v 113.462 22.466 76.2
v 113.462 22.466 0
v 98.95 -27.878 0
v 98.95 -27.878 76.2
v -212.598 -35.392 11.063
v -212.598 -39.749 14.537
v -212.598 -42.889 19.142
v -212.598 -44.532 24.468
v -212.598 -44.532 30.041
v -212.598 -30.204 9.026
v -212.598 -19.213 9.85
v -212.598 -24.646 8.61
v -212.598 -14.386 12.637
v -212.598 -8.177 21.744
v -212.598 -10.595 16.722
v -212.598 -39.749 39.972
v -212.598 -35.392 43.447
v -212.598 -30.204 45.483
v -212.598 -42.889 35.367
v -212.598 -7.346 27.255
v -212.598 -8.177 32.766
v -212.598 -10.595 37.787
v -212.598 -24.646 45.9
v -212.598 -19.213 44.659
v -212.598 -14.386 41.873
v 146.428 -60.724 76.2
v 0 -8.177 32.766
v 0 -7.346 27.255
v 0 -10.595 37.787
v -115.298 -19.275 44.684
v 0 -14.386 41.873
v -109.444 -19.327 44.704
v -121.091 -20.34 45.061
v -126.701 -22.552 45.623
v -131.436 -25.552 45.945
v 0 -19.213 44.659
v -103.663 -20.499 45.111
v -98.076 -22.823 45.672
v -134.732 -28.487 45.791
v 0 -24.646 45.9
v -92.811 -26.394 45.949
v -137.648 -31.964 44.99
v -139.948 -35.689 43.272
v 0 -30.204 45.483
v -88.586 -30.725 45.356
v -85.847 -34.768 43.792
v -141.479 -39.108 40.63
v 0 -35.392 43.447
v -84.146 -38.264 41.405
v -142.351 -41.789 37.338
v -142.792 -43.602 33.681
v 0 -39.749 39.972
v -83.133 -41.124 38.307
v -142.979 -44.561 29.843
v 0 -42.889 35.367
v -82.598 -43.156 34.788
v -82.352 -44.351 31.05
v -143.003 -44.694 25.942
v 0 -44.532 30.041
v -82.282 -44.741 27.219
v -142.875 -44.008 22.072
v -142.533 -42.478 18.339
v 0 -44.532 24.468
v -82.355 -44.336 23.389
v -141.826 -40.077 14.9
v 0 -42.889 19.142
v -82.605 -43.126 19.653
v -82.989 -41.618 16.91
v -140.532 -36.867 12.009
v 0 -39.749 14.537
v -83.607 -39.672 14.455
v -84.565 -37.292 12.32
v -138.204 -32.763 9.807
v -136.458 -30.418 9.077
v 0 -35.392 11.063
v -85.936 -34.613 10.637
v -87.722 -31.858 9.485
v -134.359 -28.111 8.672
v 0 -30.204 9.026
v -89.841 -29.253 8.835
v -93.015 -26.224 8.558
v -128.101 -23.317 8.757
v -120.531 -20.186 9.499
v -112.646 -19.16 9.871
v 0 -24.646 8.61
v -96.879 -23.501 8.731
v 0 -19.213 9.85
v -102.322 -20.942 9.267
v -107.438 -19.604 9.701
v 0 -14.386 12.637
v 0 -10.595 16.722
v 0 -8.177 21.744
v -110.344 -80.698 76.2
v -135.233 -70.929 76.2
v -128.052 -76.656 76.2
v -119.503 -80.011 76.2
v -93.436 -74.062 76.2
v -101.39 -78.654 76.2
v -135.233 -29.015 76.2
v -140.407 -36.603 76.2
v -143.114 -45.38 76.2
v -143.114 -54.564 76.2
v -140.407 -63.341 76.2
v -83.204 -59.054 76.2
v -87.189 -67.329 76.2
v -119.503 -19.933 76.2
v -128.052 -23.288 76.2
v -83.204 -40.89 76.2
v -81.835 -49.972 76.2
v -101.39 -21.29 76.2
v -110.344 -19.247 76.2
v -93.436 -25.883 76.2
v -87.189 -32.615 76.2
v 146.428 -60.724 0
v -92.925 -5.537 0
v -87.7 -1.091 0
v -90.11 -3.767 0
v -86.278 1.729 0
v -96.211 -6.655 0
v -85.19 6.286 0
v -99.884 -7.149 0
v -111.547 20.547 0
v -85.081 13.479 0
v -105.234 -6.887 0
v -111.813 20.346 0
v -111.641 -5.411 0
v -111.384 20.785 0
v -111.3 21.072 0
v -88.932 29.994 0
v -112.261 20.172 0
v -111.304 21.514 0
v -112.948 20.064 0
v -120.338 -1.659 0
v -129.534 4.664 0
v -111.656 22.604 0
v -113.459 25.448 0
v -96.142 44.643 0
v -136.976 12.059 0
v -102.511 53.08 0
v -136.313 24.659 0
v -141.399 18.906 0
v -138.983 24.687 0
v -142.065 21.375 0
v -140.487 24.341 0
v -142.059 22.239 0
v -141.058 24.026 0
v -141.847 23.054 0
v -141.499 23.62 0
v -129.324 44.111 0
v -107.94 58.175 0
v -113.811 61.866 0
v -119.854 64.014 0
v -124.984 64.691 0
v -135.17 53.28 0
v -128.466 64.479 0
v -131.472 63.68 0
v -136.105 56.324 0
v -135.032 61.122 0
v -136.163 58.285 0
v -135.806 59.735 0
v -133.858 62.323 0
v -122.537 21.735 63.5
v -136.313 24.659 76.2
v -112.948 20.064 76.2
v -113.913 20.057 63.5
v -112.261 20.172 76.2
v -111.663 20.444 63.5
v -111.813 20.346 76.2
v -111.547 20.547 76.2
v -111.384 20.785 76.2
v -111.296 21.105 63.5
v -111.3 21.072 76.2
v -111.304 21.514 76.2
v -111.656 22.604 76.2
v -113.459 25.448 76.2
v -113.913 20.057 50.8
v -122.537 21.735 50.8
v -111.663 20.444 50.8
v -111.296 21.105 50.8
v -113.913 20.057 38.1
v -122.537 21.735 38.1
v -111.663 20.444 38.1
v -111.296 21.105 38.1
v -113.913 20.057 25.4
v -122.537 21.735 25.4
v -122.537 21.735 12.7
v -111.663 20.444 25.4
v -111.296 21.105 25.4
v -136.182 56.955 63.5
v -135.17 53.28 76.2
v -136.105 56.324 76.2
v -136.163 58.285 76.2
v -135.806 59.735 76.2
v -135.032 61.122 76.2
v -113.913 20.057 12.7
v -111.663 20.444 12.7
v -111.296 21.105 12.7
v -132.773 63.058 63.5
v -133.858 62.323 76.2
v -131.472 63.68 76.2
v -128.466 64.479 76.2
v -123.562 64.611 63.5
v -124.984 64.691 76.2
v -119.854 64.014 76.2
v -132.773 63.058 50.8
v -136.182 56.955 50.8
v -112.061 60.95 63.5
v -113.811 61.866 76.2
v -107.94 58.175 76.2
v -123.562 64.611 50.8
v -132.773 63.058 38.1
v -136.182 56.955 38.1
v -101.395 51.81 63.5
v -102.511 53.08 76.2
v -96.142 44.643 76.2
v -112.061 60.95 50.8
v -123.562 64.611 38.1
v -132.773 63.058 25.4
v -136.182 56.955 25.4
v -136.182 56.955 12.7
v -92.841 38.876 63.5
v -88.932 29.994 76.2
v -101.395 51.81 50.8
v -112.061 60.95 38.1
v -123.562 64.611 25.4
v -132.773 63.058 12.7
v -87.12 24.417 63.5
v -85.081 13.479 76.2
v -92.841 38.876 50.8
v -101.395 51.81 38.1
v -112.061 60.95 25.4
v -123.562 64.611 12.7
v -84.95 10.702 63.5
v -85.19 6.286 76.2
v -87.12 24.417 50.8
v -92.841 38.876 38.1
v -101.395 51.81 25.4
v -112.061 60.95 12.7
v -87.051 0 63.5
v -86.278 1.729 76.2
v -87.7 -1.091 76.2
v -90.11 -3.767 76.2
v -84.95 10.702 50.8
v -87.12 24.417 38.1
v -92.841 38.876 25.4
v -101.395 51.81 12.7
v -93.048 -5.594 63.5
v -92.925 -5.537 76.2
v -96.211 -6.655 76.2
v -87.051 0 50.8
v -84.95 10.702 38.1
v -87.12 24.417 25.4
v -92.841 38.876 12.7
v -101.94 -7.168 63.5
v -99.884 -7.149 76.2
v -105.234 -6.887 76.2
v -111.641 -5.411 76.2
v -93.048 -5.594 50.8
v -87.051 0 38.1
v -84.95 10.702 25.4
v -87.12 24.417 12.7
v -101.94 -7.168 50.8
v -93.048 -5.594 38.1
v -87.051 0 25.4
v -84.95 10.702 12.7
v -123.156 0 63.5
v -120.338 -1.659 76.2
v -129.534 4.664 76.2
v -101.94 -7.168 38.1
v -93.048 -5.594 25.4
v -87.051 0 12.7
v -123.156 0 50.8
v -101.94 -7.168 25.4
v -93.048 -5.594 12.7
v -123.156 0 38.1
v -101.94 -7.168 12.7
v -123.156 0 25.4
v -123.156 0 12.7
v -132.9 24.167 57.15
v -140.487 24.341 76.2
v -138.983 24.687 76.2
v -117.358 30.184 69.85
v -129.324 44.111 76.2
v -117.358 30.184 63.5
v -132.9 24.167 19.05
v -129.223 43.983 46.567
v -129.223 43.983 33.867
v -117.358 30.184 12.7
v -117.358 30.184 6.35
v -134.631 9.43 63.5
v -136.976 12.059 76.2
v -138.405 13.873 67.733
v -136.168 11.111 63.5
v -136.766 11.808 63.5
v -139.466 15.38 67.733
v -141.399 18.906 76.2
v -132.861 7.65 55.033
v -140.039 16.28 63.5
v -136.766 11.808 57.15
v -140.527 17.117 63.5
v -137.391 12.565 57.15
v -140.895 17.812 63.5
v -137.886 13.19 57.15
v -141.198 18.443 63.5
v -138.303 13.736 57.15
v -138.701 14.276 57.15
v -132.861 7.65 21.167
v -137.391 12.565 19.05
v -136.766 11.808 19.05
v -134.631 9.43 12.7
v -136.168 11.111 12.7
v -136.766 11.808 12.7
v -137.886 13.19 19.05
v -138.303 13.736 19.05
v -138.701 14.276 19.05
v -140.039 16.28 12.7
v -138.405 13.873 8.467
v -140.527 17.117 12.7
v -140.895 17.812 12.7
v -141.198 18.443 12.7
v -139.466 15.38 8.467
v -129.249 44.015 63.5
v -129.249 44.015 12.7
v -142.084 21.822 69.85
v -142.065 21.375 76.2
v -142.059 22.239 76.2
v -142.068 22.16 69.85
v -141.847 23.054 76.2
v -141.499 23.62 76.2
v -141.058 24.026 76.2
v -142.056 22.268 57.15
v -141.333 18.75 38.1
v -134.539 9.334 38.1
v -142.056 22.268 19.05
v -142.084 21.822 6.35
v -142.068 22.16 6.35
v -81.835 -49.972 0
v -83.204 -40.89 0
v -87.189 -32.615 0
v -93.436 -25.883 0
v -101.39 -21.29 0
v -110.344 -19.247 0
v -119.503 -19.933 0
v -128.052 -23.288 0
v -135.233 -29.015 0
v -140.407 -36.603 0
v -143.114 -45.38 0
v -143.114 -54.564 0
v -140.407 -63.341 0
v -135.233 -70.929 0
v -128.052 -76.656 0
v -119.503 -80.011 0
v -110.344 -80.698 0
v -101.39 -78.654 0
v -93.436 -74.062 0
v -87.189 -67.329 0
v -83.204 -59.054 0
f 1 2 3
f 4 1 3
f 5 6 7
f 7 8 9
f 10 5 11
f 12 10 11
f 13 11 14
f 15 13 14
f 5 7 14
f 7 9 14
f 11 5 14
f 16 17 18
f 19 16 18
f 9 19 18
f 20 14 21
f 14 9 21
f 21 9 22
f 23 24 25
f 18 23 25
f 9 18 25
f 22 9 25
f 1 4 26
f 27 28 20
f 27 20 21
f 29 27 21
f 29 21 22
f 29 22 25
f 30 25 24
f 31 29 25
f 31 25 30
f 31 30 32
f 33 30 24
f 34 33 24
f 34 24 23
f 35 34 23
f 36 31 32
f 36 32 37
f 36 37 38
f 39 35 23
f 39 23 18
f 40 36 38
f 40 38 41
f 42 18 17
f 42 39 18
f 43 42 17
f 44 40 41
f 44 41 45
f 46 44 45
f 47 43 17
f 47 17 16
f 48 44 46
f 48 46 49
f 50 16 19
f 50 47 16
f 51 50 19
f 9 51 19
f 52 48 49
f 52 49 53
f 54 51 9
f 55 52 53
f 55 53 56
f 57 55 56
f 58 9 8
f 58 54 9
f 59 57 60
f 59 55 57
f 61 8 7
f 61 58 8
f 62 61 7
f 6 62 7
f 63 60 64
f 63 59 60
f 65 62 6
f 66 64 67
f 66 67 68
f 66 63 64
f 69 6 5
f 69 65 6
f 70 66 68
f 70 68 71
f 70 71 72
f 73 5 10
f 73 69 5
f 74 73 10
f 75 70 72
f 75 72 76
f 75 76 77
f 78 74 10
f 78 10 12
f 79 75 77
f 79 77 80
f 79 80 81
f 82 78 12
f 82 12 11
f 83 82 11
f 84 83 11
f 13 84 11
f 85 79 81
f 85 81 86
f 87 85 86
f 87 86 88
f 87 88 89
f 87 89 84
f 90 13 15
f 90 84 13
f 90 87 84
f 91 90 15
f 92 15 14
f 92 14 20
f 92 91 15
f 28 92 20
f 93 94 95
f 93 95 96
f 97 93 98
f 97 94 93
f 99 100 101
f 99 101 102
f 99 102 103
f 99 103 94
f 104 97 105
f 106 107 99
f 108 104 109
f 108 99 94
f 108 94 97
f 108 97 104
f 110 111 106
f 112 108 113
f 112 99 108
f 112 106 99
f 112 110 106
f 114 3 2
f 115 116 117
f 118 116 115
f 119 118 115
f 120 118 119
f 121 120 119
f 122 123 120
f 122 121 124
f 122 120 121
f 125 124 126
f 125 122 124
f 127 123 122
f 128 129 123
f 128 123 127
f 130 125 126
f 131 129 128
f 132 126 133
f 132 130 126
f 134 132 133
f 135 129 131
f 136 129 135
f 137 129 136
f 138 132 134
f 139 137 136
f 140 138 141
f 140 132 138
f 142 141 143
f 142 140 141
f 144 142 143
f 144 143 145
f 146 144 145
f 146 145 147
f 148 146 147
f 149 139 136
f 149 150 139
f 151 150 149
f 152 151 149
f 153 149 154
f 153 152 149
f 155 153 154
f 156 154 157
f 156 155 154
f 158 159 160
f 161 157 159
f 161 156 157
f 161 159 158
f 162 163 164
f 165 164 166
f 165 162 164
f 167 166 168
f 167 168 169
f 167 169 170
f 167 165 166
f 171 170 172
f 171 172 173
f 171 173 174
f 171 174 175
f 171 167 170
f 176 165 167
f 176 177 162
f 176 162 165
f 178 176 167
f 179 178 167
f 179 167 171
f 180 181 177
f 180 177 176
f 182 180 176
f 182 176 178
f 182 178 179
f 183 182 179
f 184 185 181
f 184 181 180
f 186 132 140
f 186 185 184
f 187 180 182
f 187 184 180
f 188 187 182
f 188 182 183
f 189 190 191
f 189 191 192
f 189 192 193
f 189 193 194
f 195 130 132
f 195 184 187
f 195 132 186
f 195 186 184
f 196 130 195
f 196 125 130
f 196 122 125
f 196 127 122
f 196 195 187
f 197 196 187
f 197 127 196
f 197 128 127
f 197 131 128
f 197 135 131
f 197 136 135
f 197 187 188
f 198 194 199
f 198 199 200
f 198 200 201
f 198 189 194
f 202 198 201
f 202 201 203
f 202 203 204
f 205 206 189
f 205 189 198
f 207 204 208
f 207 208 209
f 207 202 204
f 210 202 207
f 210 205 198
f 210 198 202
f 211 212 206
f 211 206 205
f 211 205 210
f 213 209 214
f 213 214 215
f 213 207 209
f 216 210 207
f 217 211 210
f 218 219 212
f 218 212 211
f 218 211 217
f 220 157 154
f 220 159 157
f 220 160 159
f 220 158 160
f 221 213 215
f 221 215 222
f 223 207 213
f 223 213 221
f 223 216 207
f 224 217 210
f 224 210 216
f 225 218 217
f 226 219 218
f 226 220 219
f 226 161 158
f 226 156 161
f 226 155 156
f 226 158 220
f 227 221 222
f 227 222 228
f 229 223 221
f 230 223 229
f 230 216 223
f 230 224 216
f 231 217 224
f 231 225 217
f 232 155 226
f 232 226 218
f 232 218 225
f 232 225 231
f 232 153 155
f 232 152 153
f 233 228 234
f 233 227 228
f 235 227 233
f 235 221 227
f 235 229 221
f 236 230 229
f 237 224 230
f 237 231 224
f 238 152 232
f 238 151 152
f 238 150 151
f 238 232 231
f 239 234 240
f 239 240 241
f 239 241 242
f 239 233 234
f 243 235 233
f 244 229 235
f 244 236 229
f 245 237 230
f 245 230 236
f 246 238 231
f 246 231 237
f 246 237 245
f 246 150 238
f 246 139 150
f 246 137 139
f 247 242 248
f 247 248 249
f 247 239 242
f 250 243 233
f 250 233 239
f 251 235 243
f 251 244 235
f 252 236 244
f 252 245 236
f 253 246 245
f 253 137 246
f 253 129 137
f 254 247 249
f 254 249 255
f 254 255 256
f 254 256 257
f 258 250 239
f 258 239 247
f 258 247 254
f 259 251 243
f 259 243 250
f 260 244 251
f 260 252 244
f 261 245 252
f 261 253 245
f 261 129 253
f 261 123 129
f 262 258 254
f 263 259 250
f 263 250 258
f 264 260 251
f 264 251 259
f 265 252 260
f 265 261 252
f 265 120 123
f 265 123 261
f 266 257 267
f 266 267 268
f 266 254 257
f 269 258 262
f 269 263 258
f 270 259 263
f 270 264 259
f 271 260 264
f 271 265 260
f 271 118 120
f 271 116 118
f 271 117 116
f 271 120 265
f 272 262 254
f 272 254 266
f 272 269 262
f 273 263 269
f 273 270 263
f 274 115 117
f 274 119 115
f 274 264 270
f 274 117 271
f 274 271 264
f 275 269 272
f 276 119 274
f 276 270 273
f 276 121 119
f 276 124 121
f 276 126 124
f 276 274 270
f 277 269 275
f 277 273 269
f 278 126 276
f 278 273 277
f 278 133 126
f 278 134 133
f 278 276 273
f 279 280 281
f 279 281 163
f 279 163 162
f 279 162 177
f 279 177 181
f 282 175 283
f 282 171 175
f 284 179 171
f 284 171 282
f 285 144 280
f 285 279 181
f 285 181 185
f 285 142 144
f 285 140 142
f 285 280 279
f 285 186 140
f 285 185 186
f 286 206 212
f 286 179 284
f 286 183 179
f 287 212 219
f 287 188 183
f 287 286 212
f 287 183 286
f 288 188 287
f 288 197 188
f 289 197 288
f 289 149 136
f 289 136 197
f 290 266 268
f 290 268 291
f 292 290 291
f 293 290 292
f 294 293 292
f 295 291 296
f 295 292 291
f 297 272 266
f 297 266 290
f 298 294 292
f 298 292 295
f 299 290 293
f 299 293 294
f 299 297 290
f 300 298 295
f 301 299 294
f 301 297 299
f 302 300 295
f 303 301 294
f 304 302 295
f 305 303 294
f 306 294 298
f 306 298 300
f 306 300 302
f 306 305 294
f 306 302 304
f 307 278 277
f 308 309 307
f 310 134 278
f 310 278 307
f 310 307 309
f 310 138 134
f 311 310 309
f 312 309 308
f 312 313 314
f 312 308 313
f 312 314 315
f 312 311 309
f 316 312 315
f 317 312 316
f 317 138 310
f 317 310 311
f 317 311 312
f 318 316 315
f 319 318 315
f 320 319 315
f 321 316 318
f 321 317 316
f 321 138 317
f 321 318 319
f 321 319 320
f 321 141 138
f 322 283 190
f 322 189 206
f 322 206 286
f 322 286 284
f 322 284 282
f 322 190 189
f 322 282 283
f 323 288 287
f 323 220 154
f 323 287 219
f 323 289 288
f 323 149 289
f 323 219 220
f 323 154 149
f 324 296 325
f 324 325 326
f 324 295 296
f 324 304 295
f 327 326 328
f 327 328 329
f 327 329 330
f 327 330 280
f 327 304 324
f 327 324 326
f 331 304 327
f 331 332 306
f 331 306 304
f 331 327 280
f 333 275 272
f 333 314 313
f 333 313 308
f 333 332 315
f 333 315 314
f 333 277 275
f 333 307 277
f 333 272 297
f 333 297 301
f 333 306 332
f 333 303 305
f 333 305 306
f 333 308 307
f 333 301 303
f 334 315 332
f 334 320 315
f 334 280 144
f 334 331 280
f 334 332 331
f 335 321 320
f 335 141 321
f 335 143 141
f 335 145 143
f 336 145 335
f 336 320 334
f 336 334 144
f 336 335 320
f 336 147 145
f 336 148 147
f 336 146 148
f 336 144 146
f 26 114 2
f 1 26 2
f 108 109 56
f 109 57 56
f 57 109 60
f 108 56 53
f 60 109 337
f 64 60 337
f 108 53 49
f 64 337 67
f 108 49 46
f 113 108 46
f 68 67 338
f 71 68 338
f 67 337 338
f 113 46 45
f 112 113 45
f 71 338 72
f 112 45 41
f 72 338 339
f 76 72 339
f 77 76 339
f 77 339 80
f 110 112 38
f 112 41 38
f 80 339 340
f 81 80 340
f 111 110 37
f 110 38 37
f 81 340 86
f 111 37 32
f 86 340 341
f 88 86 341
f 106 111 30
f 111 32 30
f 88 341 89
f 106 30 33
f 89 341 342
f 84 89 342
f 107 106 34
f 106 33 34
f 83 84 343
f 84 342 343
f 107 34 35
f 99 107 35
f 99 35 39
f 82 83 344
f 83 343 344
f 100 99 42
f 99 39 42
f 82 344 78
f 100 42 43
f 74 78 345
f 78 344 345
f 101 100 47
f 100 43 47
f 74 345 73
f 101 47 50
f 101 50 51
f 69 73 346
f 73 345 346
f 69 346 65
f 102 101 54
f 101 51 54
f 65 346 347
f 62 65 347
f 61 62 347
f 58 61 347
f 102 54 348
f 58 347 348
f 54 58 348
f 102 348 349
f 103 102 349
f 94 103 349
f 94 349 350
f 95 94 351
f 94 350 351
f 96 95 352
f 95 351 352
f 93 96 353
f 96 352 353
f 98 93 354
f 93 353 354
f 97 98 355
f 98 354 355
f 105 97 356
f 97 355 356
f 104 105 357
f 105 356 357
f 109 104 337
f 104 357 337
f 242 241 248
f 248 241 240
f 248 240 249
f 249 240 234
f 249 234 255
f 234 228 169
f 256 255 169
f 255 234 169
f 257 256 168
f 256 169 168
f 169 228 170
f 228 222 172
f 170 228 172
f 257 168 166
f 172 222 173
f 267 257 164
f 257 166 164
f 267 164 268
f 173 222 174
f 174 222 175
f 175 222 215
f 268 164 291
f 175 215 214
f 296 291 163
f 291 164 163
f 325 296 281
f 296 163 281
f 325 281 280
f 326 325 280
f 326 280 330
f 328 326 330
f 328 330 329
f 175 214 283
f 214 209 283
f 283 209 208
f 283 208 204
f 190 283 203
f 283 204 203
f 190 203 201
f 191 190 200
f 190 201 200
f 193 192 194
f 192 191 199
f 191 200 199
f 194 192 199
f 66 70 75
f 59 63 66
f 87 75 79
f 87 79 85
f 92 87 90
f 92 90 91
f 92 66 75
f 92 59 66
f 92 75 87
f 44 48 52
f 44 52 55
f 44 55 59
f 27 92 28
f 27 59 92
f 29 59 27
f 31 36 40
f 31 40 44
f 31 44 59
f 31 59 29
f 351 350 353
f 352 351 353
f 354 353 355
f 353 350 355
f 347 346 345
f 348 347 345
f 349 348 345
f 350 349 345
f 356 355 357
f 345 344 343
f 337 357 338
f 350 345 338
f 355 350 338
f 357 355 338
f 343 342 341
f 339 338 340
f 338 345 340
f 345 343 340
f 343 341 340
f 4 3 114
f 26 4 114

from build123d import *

# Parameters (mm, degrees)
F0_R     = 30.811611331
F1_DEPTH = 76.2
F2_R     = 18.6971508948
F3_DEPTH = 212.598


with BuildPart() as f1:
    # F0 (on Top) → F1 (new body)
    with BuildSketch(Plane.XY):
        with Locations((-112.6464754343, -49.9720610678)):
            Circle(F0_R)
    extrude(amount=F1_DEPTH)

    # F2 (on Right) → F3 (join)
    with BuildSketch(Plane.YZ):
        with Locations((-26.0433871299, 27.2547081113)):
            Circle(F2_R)
    extrude(amount=-F3_DEPTH)


with BuildPart() as f1b:
    # F0 (on Top) → F1, piece 2 (new body)
    with BuildSketch(Plane.XY):
        with BuildLine():
            add(Edge.make_bspline(
                [(-140.4866576195, 24.3408698589), (-134.8615042918, 26.6907800784), (-87.3968522729, 6.6396396226), (-155.2191145547, 62.2964469519), (-100.6008018356, 71.1715990029), (-70.0791004951, -12.4157216571), (-124.4355264908, -7.3729145233), (-146.1710125319, 21.9662281519), (-140.4866576195, 24.3408698589)],
                knots=[0, 0, 0, 0, 0.1478093617, 0.3288941588, 0.4657669392, 0.6864497206, 0.8506350276, 1, 1, 1, 1], degree=3))
        make_face()
    extrude(amount=F1_DEPTH)


with BuildPart() as f1c:
    # F0 (on Top) → F1, piece 3 (new body)
    with BuildSketch(Plane.XY):
        Polygon((98.9495068789, -27.8777908534), (146.4279145002, -60.7237517834), (113.4624555707, 22.4664118141), align=None)
    extrude(amount=F1_DEPTH)


solid = Compound([f1.part, f1b.part, f1c.part])
